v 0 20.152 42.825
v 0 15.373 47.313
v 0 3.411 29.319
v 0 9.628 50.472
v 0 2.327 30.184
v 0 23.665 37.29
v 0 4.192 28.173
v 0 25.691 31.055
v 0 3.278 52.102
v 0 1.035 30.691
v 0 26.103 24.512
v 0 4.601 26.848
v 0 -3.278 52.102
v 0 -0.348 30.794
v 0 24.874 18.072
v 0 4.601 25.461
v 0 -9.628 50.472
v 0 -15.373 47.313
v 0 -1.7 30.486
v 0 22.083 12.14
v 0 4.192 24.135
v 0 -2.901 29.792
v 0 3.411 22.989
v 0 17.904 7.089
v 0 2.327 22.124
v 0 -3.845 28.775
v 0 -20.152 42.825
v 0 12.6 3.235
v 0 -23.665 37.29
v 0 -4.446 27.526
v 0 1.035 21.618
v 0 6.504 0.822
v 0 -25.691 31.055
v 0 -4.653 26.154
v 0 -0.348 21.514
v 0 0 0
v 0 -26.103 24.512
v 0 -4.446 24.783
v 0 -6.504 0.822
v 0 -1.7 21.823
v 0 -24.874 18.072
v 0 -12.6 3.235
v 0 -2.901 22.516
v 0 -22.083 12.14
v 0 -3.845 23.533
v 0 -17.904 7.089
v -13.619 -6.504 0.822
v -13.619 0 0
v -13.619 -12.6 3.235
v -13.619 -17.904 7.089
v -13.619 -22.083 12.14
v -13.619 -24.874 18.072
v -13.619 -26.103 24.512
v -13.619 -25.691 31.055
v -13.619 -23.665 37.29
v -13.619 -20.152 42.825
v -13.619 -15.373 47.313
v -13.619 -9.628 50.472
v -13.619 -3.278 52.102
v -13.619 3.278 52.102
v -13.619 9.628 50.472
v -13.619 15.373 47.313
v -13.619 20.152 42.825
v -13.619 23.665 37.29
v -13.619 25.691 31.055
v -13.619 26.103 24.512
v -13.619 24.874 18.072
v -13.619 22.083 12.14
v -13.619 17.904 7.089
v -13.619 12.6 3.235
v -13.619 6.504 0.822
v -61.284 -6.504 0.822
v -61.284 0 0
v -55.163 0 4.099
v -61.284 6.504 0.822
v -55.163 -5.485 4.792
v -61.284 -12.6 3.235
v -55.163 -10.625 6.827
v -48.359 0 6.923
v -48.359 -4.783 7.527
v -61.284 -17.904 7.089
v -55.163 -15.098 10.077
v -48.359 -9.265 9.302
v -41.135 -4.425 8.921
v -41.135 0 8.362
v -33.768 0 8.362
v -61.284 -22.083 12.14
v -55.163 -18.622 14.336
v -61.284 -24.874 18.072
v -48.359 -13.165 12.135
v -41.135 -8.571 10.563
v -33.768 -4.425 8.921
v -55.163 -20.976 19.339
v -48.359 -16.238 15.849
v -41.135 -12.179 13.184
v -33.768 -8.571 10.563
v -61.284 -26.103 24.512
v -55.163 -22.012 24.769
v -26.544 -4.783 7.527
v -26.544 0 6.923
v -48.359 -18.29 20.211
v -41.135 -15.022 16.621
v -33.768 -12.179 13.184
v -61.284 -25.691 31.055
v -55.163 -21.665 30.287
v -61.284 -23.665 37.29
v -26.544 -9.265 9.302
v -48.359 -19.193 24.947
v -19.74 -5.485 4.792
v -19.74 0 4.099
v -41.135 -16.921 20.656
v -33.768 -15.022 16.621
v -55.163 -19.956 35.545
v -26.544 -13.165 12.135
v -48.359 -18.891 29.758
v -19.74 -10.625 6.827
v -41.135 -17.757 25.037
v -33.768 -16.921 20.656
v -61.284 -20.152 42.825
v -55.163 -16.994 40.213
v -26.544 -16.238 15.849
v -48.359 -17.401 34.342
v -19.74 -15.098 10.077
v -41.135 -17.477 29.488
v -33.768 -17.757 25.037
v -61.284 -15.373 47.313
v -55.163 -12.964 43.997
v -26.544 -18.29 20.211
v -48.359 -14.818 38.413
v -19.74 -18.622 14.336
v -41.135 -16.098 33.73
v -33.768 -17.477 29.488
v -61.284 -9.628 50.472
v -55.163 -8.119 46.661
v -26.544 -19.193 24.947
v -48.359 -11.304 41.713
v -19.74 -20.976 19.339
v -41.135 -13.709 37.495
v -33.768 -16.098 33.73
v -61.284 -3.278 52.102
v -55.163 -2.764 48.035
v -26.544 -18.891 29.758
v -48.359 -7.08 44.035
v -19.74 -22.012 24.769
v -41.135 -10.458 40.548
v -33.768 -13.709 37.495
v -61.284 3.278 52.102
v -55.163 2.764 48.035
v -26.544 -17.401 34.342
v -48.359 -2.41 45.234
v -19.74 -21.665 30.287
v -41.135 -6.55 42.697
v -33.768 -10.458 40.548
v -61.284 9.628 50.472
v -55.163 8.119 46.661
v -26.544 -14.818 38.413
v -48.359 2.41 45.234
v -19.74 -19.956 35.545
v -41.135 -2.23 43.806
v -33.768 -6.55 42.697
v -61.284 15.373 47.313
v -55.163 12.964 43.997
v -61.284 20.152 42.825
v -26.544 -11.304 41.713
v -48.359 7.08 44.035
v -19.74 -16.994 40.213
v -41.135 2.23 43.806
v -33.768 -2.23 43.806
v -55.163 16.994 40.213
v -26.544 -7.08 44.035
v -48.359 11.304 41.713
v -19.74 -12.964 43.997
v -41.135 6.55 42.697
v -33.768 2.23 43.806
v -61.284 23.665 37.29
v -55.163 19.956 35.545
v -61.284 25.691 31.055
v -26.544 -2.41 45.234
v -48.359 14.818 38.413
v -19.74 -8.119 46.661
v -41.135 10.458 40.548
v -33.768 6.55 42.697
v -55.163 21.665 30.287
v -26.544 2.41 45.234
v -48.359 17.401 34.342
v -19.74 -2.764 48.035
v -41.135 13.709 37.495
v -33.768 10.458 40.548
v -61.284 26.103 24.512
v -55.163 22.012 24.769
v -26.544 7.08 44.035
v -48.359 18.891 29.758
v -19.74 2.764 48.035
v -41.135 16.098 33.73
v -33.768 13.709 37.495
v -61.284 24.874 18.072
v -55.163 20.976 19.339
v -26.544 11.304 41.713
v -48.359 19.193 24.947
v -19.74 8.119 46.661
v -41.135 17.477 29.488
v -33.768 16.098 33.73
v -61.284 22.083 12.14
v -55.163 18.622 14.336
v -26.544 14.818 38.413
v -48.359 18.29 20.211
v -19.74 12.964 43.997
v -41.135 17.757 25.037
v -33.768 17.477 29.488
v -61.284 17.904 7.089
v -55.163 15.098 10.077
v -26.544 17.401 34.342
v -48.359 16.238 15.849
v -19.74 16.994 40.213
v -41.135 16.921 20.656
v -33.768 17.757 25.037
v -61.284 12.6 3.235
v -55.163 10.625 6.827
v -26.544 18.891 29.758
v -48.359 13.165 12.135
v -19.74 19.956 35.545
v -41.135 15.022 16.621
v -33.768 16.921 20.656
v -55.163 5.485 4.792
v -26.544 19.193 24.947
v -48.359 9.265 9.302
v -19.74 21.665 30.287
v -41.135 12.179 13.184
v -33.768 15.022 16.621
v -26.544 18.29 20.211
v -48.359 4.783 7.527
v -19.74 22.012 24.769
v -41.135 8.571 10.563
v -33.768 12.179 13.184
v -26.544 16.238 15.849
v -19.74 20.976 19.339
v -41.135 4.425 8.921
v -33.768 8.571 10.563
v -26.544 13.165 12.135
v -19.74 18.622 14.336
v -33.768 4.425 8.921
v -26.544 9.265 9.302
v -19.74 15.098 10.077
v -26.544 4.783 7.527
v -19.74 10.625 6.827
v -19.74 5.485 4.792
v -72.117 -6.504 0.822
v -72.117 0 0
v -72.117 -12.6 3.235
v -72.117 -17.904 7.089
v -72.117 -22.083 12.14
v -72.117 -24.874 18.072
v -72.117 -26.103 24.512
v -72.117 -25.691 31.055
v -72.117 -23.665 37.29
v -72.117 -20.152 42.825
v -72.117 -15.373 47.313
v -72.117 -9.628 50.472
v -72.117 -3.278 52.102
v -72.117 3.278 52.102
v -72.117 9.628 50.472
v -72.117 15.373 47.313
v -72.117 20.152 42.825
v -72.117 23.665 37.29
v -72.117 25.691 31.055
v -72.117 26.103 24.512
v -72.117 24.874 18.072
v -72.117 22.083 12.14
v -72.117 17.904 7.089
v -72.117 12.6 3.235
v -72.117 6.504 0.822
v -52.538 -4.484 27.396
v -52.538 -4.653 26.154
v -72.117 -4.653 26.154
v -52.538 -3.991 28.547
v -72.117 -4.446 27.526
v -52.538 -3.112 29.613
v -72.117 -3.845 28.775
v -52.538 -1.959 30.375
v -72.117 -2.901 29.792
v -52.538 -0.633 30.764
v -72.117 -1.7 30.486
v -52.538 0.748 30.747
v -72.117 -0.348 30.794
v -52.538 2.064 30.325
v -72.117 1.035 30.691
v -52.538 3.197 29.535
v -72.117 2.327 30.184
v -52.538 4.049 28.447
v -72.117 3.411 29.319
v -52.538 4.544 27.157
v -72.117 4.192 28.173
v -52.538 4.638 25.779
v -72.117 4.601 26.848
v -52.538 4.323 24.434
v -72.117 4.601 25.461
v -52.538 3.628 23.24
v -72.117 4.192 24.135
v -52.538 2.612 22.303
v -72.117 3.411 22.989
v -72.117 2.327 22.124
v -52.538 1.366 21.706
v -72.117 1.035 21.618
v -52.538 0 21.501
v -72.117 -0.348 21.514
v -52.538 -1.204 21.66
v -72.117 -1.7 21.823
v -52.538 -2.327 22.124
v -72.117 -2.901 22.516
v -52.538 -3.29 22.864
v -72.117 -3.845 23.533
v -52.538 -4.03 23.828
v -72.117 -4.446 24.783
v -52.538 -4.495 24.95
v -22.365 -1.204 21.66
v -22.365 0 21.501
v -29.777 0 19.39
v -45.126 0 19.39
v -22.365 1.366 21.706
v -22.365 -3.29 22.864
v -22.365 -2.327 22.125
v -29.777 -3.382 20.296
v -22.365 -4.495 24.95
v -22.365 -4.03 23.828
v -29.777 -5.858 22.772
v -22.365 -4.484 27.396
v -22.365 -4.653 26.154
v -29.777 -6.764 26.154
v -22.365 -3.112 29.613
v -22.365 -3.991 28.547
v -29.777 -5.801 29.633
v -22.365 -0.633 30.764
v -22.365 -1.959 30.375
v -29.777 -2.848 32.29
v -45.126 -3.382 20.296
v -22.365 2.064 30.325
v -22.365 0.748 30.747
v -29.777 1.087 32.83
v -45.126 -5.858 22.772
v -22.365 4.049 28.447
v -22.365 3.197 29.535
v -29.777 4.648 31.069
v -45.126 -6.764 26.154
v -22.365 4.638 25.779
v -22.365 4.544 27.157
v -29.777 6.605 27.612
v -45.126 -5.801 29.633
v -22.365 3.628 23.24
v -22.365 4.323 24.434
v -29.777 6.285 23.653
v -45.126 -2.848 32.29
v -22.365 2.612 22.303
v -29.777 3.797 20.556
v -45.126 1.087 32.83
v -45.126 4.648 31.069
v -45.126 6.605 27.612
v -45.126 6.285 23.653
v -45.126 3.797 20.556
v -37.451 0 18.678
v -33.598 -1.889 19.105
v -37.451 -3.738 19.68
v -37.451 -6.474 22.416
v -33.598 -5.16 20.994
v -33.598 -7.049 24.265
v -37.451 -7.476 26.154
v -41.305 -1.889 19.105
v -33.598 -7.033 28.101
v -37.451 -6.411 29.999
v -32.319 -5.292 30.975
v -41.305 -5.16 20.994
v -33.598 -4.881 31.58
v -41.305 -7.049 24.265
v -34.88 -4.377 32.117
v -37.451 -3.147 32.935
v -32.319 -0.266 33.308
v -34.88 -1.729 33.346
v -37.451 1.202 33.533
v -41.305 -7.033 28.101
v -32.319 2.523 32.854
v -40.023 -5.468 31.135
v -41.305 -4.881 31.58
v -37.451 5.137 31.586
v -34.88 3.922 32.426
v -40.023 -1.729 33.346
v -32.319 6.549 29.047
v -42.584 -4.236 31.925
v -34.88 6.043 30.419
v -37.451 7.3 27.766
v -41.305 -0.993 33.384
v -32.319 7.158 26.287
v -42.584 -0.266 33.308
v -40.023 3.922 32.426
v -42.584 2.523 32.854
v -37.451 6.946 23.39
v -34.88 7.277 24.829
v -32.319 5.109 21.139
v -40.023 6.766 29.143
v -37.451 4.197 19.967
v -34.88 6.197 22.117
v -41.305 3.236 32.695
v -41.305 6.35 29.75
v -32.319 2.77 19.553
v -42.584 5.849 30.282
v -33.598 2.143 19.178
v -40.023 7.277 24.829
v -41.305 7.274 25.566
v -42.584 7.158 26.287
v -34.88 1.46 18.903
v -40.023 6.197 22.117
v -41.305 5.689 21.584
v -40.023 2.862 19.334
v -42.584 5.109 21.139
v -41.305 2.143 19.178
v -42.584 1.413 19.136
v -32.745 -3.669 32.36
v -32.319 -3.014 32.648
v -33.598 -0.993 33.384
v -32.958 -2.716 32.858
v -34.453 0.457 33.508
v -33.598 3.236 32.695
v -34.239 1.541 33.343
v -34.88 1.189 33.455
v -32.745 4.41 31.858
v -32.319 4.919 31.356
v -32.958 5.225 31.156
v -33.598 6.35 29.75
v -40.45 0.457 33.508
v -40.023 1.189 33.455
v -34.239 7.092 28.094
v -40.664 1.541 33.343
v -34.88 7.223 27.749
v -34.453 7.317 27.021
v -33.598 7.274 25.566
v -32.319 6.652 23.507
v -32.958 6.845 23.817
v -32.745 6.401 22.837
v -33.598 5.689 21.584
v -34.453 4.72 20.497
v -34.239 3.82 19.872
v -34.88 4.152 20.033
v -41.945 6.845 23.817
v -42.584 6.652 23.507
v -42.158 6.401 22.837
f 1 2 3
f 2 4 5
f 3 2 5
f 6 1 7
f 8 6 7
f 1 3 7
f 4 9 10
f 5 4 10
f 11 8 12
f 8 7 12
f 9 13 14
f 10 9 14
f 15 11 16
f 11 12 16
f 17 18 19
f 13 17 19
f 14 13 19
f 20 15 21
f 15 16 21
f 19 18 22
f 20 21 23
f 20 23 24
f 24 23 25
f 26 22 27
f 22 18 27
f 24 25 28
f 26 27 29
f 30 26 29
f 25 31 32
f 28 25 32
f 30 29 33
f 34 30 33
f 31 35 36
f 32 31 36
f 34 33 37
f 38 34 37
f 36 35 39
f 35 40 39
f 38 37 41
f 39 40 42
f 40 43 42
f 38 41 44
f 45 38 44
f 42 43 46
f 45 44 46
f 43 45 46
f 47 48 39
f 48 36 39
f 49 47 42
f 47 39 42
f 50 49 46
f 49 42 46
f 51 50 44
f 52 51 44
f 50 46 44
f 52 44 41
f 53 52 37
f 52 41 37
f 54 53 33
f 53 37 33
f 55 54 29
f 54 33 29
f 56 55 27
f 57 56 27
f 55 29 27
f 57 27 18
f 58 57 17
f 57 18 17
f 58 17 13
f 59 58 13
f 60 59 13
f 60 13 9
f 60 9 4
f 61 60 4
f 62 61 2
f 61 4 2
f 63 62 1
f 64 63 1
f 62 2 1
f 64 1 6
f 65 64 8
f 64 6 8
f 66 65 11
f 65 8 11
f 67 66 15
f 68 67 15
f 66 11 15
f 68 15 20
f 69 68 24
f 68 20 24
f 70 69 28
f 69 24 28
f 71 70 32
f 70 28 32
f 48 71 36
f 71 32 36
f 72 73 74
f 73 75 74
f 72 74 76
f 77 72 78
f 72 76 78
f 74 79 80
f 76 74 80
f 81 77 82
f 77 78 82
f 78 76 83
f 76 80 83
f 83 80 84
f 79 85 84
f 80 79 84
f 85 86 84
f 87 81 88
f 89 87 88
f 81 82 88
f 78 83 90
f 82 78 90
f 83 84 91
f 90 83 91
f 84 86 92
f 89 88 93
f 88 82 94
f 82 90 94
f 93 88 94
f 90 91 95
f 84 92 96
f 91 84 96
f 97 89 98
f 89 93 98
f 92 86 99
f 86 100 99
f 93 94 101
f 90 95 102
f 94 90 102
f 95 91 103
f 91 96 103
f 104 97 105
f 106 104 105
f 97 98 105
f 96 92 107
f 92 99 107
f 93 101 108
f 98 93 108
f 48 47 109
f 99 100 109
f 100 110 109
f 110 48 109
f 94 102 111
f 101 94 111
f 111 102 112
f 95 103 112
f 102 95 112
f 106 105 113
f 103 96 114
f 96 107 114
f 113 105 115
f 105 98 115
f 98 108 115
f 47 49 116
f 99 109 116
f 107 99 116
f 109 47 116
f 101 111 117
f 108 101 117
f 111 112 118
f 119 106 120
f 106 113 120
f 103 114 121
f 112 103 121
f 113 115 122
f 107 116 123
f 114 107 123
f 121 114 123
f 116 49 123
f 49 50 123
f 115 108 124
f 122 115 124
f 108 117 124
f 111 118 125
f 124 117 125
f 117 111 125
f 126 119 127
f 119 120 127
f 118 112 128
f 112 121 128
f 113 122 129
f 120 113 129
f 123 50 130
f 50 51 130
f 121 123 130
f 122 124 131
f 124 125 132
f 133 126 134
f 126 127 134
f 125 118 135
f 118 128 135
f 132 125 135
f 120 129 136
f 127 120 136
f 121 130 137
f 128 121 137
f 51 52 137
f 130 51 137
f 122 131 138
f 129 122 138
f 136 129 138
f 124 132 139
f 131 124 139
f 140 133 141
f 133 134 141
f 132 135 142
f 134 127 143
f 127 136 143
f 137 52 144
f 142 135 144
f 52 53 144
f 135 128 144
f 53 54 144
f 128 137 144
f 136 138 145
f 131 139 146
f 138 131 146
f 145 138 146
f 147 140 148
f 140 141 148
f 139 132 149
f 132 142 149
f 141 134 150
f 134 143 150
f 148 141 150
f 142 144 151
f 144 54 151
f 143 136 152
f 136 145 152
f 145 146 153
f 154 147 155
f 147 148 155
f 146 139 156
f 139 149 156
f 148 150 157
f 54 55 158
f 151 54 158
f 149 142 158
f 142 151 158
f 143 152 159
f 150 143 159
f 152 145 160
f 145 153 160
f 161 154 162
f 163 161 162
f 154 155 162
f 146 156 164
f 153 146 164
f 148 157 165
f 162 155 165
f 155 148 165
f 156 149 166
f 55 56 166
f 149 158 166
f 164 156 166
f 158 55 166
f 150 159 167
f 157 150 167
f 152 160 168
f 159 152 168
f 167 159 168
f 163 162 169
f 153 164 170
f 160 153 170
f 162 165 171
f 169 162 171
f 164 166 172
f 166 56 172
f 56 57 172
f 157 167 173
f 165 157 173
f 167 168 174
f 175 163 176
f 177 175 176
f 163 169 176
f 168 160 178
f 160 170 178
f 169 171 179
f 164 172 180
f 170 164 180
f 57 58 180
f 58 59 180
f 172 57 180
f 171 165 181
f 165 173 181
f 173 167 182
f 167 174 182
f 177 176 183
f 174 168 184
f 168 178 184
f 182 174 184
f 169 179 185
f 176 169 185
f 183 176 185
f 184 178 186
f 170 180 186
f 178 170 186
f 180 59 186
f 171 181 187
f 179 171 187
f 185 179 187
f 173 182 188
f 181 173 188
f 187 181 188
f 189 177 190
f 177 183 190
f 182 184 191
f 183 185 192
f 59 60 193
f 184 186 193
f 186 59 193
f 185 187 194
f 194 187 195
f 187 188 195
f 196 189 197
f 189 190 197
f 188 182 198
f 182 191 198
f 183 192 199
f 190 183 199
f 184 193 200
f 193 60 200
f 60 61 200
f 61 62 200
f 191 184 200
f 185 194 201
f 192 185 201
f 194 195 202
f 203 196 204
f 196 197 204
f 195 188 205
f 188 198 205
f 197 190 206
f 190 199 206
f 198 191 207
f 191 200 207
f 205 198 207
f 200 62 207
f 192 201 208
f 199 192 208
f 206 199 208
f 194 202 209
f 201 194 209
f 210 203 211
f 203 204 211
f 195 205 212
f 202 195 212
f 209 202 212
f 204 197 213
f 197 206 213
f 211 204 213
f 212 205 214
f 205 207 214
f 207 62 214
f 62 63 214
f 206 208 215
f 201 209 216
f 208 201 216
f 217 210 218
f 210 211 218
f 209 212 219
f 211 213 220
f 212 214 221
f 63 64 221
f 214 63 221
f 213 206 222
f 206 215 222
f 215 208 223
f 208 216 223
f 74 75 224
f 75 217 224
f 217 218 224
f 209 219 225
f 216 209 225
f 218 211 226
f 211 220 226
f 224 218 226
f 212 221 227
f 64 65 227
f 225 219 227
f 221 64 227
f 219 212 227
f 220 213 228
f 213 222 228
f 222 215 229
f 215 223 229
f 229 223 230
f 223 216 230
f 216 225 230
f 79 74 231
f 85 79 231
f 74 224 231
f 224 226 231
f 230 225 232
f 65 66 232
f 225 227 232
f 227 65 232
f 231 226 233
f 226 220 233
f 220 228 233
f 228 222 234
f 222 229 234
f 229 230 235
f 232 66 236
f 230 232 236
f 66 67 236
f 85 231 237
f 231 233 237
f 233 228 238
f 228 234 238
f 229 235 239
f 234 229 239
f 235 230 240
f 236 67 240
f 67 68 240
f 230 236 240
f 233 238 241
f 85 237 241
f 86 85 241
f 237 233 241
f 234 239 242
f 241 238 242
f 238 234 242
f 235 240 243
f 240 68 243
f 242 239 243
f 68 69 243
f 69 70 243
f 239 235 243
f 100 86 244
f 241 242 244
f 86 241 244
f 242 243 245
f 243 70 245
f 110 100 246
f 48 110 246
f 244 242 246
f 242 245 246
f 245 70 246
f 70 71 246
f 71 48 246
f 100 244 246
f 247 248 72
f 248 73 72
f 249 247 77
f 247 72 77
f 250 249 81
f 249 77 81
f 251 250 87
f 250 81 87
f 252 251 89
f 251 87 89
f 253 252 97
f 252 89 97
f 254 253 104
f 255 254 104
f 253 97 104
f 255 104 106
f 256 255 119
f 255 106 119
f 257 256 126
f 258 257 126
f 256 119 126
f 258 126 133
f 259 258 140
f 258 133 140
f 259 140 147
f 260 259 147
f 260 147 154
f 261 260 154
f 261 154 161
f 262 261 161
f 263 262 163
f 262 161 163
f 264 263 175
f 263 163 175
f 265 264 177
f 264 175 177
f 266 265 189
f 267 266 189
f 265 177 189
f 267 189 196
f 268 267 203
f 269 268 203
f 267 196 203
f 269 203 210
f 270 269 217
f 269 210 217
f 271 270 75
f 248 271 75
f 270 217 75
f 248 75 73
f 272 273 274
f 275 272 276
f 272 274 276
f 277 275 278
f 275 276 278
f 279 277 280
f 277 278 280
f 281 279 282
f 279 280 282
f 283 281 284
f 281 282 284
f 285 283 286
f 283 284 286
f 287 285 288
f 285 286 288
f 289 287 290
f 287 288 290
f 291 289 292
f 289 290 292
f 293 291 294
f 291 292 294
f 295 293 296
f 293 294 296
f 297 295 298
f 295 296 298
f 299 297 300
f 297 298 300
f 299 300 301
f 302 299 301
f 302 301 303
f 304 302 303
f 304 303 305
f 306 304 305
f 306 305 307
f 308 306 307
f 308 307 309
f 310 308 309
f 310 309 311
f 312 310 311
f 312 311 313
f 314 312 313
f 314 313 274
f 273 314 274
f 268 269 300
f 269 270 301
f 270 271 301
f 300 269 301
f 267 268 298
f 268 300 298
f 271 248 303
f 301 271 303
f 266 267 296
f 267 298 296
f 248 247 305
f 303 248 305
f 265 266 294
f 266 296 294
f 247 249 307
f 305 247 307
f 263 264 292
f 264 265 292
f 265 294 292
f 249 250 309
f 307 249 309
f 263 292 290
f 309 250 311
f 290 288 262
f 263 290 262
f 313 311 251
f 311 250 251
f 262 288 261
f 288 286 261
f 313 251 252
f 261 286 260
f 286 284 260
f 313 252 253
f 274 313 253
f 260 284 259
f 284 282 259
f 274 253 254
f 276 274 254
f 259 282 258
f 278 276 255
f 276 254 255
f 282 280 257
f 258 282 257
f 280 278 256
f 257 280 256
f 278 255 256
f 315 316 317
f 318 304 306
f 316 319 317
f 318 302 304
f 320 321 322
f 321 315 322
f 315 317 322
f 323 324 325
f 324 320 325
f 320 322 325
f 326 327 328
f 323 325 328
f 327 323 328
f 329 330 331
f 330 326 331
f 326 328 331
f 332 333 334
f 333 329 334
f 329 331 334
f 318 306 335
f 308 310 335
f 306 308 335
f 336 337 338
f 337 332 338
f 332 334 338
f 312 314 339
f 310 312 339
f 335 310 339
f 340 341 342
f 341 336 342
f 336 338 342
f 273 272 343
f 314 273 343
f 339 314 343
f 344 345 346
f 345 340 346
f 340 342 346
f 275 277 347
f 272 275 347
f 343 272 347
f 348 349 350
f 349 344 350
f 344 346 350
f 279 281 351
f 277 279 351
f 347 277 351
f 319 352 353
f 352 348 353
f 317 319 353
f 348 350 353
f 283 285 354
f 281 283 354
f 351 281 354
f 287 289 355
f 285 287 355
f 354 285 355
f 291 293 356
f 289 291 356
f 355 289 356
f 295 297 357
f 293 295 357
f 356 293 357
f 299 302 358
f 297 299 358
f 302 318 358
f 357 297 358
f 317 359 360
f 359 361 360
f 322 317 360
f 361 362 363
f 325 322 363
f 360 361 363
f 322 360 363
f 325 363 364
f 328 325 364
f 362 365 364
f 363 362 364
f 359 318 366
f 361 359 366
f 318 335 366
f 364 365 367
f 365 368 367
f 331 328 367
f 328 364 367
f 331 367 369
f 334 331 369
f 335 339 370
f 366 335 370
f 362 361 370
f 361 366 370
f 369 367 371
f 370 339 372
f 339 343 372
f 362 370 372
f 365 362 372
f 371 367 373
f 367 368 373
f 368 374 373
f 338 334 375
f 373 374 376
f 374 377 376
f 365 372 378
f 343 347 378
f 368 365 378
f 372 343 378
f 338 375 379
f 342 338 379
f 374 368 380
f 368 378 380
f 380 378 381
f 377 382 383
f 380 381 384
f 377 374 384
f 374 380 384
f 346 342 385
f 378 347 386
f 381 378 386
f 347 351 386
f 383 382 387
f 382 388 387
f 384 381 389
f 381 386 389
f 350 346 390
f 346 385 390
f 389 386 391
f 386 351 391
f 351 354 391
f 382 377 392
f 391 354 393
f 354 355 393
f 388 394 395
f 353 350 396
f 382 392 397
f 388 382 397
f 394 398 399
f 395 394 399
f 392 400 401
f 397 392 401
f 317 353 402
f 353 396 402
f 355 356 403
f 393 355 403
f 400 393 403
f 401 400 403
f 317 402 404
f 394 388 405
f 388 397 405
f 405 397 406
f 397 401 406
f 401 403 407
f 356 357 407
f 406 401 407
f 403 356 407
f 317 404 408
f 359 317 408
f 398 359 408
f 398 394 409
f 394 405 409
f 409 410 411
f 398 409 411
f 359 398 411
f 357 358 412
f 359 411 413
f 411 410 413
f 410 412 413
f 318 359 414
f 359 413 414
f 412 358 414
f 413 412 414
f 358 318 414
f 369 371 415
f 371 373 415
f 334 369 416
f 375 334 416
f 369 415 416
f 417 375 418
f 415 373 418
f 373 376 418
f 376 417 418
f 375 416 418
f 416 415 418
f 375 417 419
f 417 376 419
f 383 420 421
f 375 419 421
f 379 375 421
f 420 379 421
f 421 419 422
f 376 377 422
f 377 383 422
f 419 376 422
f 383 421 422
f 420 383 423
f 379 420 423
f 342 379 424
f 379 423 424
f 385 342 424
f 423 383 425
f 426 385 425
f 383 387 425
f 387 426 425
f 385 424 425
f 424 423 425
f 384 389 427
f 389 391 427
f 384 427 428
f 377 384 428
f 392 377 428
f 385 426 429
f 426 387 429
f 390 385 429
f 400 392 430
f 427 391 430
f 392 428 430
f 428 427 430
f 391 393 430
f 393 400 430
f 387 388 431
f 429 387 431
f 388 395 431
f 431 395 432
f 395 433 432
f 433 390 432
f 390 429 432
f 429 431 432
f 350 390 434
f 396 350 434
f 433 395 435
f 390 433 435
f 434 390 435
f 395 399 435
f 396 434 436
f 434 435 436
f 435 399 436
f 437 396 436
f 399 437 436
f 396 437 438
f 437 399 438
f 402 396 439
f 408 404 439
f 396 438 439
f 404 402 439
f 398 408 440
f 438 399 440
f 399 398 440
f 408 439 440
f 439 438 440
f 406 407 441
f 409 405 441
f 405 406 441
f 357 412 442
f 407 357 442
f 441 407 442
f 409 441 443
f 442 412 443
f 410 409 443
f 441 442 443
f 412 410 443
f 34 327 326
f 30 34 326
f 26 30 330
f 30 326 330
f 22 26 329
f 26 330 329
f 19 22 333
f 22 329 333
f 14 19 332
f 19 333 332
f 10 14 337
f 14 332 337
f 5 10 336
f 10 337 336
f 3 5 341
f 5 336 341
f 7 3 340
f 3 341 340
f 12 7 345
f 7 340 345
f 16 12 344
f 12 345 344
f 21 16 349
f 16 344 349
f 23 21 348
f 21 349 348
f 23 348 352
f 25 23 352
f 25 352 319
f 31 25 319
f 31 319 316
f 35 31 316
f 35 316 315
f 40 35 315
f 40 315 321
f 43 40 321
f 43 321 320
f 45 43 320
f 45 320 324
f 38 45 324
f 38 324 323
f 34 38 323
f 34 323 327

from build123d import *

# Parameters (mm, degrees)
F2_R      = 4.653054
F3_DEPTH  = 25.4
F3_FACE_R = 4.653054
F4_DEPTH  = 97.518329


with BuildPart() as f1:
    # F0 (on Front) → F1 (revolve)
    with BuildSketch(Plane.XZ):
        with BuildLine():
            Line((-13.618723, 0), (0, 0))
            Line((0, 0), (0, 26.15414))
            Line((0, 26.15414), (-13.618723, 26.15414))
            ThreePointArc((-13.618723, 26.15414), (-37.451489, 18.678233), (-61.284255, 26.15414))
            Line((-61.284255, 26.15414), (-72.117329, 26.15414))
            Line((-72.117329, 26.15414), (-72.117329, 0))
            Line((-72.117329, 0), (-61.284255, 0))
            ThreePointArc((-61.284255, 0), (-37.451489, 8.543639), (-13.618723, 0))
        make_face()
    revolve(axis=Axis((-6.809361, 0, 26.15414), (-1, 0, 0)))

    # F2 (on face) → F3 (join)
    with BuildSketch(Plane(origin=(-72.117329, 0, 0), x_dir=(0, -1, 0), z_dir=(-1, 0, 0))):
        with Locations((0, 26.15414)):
            Circle(F2_R)
    extrude(amount=F3_DEPTH)

    # F3_face (on face) → F4 (cut, through all)
    with BuildSketch(Plane(origin=(-97.517329, 0, 26.15414), x_dir=(0, -1, 0), z_dir=(-1, 0, 0))):
        Circle(F3_FACE_R)
    extrude(amount=-F4_DEPTH, mode=Mode.SUBTRACT)


solid = f1.part
